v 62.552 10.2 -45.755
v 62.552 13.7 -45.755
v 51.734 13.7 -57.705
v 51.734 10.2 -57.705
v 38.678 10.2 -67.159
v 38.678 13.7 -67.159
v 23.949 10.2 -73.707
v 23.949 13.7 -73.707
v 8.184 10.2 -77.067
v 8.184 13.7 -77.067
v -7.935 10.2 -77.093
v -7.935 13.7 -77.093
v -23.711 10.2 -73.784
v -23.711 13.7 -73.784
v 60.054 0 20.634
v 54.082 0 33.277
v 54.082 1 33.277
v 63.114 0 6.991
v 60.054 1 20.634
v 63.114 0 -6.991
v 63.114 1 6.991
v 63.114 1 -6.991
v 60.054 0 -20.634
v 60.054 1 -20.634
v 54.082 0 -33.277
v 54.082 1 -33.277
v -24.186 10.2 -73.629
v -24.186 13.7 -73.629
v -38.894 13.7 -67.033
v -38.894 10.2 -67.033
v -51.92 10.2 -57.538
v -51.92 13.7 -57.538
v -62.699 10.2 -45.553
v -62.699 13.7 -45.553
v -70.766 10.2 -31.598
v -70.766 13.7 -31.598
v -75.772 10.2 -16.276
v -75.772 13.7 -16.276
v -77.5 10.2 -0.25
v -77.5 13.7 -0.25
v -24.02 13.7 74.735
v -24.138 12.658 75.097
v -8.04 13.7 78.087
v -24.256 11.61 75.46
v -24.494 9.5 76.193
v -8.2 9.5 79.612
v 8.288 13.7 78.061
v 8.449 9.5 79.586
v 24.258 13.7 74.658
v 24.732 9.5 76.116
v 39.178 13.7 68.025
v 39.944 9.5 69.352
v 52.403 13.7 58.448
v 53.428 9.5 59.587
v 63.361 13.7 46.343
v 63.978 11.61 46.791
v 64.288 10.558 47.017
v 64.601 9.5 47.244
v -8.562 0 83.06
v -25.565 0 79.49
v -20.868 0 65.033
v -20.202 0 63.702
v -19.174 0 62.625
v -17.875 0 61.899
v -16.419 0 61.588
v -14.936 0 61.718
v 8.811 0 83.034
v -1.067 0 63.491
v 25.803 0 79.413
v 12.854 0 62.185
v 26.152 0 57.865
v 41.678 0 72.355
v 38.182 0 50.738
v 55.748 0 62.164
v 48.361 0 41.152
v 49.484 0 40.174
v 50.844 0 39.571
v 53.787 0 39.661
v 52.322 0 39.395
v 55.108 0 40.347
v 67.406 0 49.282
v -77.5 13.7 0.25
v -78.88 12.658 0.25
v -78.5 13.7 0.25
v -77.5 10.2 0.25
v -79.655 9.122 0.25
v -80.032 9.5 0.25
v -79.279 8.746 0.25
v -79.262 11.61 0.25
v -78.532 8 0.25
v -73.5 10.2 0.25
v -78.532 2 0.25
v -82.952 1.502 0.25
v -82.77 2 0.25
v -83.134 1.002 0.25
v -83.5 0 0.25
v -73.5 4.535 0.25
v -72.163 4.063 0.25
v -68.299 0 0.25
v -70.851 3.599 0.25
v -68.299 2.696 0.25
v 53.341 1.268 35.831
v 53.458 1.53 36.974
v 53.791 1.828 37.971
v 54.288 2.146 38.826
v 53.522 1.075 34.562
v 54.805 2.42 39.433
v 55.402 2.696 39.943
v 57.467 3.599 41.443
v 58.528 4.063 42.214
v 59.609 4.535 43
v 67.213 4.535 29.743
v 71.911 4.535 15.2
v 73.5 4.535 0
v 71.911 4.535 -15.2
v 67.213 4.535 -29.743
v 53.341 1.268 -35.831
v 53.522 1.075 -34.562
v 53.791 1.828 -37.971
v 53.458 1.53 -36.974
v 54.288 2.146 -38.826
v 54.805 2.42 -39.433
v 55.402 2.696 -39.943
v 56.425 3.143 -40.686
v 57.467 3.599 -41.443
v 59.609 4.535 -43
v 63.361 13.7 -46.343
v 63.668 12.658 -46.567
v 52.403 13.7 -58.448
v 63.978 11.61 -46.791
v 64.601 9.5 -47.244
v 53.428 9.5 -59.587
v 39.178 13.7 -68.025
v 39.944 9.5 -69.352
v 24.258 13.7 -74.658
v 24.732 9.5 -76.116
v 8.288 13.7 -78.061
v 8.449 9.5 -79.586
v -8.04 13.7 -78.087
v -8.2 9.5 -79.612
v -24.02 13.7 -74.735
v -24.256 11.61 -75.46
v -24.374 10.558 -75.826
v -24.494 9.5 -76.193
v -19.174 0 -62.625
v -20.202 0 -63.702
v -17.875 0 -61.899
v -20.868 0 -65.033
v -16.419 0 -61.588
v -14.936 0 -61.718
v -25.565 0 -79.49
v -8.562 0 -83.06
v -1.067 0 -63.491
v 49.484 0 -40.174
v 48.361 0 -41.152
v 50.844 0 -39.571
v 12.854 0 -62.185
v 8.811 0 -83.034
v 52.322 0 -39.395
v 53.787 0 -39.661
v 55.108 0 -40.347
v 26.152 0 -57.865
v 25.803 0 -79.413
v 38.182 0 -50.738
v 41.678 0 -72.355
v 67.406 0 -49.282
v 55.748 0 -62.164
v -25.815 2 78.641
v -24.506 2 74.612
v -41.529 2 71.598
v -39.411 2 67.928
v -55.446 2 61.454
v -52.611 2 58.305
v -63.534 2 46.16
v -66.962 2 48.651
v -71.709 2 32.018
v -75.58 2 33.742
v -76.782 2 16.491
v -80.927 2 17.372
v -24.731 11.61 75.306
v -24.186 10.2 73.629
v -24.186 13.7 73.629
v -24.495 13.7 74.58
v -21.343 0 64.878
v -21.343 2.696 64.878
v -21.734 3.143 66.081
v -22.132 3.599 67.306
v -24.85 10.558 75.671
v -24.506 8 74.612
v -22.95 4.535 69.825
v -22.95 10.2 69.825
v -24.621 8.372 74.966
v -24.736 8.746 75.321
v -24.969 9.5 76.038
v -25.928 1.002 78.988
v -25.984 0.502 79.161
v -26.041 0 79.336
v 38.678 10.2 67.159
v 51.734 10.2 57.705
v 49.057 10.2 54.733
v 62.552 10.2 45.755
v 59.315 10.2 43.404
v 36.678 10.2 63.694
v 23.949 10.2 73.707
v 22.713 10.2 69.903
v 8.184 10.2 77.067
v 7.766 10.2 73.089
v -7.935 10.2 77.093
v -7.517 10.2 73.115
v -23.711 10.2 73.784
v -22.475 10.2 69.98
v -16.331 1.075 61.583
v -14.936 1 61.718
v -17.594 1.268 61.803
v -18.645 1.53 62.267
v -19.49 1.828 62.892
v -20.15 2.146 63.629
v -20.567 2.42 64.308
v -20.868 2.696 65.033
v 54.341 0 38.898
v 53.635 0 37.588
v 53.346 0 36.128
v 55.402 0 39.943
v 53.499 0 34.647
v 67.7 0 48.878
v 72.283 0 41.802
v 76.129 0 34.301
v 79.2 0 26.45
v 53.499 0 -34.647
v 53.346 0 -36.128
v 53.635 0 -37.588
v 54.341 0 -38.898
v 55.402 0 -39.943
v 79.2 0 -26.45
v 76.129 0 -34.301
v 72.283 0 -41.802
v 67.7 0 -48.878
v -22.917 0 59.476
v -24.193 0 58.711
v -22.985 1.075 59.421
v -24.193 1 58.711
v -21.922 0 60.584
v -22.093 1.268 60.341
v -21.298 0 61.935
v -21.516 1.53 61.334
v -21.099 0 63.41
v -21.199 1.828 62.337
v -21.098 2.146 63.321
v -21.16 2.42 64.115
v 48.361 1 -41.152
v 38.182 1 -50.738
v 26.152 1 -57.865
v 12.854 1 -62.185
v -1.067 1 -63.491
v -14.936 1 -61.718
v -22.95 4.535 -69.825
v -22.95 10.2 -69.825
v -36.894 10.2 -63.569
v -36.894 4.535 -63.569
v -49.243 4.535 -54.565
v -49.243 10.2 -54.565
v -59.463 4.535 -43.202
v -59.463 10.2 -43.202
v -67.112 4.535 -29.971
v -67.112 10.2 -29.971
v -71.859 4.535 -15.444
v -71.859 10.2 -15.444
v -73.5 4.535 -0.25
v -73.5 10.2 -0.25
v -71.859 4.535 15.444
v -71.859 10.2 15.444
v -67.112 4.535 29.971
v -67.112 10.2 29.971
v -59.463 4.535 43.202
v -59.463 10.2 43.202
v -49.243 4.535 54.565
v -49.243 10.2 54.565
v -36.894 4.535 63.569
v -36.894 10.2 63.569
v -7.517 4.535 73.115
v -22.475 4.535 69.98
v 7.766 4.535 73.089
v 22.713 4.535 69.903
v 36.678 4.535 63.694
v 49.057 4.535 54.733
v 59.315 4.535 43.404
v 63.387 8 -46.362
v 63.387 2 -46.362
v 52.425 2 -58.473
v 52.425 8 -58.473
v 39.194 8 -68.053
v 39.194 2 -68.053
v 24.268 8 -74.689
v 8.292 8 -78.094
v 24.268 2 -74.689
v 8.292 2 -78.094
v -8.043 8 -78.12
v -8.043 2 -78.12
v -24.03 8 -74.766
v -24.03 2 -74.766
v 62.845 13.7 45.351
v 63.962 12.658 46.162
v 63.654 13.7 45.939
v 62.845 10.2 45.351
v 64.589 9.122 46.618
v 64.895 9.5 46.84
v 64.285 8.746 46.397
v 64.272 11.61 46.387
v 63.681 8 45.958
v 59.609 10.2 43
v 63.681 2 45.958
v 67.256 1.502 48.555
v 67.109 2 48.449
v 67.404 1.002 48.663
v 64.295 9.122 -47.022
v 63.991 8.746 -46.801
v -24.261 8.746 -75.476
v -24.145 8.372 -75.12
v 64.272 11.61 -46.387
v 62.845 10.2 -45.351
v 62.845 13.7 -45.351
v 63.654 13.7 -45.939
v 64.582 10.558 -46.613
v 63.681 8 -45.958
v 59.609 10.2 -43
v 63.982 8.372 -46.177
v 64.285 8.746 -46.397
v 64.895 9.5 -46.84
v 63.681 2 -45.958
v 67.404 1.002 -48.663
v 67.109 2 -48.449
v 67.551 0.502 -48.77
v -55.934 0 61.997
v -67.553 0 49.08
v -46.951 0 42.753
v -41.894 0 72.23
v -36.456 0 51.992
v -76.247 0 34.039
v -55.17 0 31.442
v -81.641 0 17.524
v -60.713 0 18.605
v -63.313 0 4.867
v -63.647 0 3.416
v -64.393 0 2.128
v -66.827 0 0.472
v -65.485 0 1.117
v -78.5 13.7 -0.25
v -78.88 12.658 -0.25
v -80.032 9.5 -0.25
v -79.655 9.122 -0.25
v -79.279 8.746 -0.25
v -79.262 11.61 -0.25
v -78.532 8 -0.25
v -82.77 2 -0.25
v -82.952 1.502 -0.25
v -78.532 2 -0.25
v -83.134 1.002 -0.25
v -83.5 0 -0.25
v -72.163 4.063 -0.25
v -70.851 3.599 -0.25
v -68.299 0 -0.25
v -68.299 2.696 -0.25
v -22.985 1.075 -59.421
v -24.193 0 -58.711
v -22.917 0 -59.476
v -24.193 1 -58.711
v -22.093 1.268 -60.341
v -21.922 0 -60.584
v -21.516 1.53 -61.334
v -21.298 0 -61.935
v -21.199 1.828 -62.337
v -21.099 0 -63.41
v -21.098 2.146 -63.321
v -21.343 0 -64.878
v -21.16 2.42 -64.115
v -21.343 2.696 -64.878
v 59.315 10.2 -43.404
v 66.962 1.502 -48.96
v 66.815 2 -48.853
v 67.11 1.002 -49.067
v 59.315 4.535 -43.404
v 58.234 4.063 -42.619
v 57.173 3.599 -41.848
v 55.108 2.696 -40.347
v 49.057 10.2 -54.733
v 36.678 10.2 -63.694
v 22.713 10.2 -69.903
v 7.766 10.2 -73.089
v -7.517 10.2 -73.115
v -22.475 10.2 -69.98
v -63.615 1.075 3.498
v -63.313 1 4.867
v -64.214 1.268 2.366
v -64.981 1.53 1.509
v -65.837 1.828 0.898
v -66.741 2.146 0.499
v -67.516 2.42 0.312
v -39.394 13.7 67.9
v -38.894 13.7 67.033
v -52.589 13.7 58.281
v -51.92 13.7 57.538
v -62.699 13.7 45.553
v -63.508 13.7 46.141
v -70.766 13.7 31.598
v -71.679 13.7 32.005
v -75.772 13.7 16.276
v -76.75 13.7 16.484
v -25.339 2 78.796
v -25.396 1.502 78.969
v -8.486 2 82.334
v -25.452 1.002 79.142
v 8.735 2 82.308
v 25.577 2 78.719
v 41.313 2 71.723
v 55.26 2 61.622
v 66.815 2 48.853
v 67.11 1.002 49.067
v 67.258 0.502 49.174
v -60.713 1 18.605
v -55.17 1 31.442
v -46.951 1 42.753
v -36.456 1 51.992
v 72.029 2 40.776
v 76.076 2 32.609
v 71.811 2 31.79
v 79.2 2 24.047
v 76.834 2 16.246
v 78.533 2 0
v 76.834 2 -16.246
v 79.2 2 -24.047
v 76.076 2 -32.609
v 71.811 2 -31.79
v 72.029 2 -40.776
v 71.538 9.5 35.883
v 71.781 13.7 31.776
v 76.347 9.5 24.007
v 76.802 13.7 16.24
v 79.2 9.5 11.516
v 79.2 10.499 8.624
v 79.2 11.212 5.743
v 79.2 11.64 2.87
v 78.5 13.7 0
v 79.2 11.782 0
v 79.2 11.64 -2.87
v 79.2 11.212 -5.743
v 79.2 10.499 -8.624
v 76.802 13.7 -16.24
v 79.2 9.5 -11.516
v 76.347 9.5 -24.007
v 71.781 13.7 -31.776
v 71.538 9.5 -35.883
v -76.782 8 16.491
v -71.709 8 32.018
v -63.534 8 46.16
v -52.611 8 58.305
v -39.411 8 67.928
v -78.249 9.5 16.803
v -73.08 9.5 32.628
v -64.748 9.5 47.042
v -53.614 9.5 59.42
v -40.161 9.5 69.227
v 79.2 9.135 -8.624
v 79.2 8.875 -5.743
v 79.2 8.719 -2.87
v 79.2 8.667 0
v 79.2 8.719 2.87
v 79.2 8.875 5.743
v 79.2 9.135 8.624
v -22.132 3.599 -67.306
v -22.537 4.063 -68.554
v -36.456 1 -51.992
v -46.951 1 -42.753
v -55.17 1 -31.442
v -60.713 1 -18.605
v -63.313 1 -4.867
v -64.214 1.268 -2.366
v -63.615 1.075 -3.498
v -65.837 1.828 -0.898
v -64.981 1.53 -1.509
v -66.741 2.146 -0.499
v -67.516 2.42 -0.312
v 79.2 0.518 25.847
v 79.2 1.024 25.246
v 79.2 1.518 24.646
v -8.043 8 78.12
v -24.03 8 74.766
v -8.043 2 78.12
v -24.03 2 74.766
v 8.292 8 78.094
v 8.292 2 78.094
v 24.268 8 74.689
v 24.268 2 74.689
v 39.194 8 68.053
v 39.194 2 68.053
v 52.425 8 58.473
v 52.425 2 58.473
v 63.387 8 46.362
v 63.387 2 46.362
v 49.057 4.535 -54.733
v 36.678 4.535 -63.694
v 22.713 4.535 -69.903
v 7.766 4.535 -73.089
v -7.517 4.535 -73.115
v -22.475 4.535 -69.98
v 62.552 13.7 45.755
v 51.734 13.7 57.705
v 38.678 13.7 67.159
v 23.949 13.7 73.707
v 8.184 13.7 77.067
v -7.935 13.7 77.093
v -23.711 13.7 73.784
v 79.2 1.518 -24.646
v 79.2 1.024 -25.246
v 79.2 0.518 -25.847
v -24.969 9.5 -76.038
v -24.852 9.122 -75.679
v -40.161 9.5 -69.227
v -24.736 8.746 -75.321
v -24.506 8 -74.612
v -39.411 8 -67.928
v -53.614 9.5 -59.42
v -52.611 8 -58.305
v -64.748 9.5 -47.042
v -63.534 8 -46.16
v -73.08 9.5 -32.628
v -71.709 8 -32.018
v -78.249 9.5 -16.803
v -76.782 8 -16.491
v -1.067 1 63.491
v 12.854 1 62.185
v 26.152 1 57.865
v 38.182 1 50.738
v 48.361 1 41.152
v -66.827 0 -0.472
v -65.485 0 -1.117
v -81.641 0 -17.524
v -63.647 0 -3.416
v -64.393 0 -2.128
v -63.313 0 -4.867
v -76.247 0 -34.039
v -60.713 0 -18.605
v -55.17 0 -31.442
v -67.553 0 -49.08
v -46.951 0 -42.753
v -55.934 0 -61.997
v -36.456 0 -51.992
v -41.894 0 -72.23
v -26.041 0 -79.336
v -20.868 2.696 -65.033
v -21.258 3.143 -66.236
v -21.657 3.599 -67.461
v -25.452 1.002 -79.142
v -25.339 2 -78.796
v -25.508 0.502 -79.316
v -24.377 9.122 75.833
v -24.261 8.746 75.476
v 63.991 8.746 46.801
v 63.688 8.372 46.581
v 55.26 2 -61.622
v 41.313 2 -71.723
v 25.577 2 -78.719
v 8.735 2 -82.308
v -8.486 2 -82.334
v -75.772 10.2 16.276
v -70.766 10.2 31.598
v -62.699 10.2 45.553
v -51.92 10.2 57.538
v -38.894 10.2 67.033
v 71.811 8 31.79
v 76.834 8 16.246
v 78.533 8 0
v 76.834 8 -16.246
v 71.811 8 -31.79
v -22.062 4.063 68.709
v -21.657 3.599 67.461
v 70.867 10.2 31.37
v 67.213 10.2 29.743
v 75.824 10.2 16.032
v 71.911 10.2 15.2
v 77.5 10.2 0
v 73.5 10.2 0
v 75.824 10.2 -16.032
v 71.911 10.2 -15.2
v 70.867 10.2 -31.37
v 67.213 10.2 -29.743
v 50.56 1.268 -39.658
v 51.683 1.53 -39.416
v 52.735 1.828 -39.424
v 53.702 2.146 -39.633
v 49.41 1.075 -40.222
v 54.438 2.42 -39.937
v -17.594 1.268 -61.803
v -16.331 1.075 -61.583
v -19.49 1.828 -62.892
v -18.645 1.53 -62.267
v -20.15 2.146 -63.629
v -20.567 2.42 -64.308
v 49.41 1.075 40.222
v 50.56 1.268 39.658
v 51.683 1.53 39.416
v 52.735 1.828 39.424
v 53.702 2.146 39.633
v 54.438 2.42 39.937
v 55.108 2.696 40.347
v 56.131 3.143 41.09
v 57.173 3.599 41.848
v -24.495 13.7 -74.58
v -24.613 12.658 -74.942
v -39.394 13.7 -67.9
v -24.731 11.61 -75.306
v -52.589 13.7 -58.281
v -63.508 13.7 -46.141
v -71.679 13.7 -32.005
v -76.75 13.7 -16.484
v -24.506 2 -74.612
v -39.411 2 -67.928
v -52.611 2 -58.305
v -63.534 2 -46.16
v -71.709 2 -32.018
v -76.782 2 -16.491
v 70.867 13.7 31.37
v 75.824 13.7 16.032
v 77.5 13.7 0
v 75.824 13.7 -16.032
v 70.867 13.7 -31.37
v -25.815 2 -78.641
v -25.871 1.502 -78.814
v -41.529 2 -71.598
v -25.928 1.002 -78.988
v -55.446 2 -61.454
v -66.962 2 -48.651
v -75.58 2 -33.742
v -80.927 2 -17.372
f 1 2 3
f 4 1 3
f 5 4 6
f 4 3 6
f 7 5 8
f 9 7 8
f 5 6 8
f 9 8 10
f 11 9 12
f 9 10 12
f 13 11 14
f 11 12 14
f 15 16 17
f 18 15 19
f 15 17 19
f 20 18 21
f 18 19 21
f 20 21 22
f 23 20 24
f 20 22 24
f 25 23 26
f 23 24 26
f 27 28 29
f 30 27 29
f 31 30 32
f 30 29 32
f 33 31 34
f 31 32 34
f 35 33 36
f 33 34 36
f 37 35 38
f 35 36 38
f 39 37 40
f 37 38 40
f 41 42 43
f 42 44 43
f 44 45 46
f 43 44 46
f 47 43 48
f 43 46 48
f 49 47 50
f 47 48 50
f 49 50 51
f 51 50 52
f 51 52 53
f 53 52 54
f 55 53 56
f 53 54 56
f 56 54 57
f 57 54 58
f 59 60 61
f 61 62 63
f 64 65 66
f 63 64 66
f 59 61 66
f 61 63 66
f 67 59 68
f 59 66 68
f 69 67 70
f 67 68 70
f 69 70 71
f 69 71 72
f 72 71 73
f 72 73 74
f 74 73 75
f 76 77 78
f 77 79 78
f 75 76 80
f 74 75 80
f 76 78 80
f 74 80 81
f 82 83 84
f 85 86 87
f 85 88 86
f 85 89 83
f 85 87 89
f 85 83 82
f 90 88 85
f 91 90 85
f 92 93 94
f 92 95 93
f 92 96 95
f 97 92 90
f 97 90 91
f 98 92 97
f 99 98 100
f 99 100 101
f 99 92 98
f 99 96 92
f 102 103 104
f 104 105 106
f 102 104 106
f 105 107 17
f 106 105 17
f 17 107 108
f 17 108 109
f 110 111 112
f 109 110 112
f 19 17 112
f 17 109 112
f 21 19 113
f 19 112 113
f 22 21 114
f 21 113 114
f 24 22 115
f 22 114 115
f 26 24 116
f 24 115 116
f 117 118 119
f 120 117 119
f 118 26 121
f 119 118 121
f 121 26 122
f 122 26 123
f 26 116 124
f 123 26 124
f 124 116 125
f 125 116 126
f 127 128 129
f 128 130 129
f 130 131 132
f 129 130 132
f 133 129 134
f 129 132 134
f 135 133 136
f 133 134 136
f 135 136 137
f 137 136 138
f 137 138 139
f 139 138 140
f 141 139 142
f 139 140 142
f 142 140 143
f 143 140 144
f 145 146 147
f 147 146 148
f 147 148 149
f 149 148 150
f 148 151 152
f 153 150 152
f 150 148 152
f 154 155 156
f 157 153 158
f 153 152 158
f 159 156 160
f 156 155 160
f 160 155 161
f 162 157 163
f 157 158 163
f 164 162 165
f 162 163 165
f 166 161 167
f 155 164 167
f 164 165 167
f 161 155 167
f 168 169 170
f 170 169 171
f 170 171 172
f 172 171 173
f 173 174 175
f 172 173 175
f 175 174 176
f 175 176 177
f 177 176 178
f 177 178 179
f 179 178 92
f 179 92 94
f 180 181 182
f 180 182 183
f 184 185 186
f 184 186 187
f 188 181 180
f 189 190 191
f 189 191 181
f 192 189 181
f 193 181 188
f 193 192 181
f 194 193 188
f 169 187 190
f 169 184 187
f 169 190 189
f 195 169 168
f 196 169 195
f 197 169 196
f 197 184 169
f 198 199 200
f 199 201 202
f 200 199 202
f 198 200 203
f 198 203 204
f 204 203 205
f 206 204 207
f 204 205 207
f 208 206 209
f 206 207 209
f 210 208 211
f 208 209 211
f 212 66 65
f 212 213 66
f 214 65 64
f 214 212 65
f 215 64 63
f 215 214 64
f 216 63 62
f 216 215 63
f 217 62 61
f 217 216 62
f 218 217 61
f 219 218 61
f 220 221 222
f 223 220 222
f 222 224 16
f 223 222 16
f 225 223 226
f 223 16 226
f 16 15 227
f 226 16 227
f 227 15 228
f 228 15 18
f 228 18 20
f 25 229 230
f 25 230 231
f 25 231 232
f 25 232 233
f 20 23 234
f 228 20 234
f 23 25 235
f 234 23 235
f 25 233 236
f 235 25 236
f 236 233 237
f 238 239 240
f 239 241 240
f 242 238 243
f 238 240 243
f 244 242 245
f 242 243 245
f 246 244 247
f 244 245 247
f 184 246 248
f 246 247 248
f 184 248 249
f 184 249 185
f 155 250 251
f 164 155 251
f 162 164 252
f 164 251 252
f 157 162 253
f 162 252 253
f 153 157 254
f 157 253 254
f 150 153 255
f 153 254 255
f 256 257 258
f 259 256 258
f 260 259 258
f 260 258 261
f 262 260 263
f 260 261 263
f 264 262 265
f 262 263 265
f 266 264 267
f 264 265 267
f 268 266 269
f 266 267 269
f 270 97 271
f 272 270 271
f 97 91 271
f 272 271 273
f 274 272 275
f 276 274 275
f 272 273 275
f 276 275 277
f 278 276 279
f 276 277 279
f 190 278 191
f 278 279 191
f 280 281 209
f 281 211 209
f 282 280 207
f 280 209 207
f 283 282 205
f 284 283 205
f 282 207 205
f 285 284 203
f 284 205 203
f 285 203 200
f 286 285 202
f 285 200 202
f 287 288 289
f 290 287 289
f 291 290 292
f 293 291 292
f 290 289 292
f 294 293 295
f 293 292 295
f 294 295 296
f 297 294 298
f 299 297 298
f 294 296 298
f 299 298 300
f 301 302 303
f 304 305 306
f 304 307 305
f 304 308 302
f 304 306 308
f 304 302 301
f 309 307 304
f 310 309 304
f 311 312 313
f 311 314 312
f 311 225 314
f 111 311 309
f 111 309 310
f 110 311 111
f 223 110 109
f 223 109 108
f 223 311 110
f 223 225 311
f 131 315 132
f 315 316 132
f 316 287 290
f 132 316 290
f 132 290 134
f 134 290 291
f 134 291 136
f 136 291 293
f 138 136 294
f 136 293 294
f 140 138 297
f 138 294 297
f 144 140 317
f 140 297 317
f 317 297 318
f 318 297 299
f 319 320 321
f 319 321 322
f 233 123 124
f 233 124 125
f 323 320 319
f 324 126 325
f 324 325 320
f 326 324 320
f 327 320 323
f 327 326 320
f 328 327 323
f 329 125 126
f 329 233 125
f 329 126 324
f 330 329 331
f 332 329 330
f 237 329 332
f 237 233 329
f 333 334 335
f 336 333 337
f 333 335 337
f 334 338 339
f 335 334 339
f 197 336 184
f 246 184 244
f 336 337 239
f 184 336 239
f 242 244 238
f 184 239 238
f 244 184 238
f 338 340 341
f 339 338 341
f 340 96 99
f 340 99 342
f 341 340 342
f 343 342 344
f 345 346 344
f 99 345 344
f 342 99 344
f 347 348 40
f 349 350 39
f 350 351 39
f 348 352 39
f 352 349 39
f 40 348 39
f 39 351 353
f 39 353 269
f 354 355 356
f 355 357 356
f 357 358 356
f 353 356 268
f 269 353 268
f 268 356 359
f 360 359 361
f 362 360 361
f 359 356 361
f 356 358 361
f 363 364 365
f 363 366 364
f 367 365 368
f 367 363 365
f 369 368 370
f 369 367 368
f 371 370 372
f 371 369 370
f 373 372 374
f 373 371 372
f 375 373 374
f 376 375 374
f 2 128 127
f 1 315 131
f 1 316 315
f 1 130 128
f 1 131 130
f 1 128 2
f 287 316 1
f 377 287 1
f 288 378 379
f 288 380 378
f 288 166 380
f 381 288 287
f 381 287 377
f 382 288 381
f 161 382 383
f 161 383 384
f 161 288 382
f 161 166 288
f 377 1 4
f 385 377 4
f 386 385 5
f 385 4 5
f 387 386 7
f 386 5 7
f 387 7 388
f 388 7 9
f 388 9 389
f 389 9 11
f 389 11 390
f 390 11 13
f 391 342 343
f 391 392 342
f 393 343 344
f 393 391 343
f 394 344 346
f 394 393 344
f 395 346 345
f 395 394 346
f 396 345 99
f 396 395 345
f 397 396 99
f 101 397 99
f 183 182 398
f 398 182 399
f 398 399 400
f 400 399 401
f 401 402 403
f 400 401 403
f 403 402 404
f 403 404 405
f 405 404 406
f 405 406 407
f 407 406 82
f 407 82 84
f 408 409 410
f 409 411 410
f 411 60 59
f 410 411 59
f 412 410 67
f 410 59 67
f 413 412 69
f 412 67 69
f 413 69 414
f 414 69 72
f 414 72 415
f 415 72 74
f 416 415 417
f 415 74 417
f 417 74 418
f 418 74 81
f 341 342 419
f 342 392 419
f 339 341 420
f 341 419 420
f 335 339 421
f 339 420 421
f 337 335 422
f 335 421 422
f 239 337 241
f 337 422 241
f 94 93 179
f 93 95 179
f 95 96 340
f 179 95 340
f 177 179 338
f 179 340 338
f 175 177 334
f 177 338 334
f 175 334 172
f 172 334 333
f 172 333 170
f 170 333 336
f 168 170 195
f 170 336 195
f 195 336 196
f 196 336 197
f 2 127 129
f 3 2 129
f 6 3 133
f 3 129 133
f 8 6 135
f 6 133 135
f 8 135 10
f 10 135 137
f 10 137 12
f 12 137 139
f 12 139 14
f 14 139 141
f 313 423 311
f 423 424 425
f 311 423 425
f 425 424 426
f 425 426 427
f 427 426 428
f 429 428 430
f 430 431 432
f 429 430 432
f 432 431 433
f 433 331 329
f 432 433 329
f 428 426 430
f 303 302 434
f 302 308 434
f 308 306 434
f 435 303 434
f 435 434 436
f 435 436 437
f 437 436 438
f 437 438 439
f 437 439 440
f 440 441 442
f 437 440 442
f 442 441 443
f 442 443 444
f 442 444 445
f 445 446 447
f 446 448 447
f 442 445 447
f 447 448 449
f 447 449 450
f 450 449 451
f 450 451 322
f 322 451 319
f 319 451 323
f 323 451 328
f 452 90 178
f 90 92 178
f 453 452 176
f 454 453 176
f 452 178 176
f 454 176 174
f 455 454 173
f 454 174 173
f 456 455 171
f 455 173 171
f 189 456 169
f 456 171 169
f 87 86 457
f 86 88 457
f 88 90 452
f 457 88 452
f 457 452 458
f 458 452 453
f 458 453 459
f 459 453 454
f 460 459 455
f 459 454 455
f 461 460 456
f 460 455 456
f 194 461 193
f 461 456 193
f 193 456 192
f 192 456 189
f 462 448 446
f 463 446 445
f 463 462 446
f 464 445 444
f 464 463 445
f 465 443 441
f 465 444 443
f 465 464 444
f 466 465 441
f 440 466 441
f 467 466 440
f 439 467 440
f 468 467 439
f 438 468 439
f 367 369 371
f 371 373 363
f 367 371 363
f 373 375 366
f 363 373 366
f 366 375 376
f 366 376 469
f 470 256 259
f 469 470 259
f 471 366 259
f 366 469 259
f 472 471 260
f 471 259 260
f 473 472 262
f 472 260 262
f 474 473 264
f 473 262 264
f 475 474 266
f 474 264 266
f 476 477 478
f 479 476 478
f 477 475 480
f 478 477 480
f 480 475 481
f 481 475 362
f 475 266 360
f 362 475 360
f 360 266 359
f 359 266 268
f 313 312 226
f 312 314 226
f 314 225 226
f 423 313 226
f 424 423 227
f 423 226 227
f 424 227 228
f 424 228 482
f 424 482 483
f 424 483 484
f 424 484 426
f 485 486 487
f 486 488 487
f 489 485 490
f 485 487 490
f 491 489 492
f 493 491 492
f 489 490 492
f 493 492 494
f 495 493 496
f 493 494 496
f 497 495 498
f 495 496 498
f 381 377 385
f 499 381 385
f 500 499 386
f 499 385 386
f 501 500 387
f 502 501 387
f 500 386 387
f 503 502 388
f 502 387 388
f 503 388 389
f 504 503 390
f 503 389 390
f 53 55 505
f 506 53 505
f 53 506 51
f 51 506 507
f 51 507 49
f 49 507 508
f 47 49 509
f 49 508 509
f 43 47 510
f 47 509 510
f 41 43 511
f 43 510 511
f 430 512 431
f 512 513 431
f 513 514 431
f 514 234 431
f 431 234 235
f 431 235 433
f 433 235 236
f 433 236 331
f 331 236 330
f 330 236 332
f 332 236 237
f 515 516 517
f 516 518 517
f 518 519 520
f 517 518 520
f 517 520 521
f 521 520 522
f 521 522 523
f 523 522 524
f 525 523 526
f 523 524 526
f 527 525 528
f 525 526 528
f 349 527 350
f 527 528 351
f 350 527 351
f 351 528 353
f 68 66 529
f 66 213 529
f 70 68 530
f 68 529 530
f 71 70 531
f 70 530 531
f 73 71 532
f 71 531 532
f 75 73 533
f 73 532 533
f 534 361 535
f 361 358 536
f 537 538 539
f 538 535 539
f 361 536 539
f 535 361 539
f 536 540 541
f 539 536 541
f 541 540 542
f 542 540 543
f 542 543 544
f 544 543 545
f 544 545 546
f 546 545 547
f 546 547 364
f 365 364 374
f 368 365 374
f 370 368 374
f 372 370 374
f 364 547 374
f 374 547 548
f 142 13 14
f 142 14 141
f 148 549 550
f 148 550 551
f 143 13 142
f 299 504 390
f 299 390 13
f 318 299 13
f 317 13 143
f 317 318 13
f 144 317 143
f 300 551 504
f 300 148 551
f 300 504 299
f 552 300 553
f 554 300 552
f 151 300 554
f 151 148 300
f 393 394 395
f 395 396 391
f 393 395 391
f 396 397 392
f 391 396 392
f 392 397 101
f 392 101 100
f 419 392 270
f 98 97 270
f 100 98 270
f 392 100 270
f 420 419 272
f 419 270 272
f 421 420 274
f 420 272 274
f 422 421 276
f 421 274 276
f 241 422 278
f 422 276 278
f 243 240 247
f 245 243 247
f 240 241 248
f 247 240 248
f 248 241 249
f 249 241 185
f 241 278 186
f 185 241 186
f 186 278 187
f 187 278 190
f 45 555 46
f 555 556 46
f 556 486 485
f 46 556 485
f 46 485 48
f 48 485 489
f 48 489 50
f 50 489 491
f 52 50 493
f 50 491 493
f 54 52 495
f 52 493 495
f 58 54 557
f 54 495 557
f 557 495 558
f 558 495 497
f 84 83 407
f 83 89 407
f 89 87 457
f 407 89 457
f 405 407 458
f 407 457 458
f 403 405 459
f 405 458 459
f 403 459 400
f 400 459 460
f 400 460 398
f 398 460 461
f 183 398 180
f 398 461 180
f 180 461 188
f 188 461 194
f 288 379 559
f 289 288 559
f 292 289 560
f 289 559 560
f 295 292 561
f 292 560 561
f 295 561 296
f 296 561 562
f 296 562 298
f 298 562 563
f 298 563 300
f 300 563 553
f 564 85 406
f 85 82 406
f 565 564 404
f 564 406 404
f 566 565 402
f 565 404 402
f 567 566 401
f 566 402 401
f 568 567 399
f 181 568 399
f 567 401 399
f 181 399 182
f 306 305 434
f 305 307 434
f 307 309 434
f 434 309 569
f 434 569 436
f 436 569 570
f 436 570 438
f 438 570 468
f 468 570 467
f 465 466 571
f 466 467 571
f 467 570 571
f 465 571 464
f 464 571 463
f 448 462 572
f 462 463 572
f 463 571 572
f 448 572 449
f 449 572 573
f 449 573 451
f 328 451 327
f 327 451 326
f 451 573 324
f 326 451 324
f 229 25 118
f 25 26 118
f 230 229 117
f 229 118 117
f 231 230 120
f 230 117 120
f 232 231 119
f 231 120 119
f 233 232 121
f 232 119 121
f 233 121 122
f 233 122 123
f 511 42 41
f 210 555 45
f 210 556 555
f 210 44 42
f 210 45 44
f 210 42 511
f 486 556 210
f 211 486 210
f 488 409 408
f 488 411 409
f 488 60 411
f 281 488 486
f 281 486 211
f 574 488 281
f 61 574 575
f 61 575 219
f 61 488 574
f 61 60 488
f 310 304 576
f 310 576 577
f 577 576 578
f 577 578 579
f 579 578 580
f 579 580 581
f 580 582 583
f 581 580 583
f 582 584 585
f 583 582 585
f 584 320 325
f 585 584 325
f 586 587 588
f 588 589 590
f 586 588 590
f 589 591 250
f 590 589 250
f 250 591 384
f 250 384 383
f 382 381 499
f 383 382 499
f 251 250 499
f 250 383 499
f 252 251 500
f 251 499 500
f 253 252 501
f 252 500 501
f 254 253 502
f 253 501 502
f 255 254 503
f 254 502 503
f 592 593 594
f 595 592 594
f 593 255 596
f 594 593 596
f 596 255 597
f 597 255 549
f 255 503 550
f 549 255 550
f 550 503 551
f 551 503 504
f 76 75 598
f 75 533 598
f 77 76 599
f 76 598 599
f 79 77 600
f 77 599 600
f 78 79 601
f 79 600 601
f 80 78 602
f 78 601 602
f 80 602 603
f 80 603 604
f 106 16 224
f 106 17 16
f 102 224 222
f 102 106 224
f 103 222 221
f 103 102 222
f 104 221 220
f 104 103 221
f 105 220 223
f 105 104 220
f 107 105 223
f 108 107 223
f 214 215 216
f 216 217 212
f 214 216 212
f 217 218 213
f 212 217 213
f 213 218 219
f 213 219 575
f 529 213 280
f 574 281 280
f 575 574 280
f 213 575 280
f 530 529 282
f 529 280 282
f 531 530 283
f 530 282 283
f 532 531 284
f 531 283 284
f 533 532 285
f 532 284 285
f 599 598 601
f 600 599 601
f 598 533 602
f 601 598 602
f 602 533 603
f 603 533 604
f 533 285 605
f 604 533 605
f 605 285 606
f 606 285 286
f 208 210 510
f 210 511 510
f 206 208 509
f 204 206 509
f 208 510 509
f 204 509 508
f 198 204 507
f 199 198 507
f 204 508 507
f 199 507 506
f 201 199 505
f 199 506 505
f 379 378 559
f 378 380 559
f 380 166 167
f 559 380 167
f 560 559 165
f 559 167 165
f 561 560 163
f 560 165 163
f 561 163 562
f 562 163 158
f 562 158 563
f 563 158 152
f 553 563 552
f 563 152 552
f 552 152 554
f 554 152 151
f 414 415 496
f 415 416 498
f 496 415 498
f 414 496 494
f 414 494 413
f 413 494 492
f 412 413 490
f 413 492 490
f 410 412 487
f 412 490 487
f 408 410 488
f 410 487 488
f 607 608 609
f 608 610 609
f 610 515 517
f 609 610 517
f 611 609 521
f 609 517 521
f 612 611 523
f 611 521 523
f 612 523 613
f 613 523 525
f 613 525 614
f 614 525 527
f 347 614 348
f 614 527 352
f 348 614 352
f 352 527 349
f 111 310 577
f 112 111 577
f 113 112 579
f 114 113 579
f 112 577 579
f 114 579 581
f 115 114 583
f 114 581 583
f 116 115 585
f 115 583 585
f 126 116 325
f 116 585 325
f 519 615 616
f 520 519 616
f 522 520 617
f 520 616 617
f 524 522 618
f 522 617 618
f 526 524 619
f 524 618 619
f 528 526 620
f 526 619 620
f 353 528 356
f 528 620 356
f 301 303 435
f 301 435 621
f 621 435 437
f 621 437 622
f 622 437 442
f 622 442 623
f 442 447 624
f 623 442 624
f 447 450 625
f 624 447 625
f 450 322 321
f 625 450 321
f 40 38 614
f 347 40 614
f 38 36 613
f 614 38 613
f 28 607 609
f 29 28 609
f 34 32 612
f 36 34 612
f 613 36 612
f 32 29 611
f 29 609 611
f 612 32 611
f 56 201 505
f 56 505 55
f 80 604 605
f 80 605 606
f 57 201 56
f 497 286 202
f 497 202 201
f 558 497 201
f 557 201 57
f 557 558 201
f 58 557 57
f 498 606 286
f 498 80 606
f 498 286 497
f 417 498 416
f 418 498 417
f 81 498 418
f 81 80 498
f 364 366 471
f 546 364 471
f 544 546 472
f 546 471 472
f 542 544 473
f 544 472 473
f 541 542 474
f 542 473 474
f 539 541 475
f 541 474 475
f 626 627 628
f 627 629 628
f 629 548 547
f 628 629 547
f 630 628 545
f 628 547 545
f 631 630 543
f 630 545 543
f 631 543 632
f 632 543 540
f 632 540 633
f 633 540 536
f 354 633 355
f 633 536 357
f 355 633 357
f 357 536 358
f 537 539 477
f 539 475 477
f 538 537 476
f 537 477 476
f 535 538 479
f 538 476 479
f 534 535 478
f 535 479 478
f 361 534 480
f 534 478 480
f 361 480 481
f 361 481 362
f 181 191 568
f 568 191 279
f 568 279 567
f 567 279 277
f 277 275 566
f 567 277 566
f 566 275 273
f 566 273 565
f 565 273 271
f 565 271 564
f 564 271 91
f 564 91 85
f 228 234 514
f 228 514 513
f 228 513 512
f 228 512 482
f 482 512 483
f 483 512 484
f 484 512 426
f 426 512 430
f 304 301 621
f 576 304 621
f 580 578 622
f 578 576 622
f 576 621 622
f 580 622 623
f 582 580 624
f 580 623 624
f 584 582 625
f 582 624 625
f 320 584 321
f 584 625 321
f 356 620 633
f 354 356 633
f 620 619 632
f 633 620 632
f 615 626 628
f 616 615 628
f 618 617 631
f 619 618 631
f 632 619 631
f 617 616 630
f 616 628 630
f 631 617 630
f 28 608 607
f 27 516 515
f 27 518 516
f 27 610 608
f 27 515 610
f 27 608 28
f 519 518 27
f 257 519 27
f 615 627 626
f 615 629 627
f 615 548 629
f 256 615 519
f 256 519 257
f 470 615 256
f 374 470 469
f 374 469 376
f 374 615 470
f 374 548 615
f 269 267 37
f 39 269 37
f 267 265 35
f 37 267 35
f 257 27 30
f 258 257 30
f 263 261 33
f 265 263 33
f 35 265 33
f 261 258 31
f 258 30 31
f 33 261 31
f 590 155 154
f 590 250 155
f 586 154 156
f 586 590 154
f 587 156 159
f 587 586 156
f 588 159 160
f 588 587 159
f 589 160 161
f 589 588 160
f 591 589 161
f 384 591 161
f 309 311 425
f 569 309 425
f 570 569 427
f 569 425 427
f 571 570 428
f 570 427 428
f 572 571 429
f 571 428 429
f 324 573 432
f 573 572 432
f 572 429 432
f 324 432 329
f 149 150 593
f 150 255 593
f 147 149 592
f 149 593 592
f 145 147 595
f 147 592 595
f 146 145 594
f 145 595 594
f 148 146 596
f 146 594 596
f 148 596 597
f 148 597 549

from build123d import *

# Parameters (mm, degrees)
CUT_EXTRUDE1_DEPTH      = 14.7
SKETCH4_W               = 52.41384378
SKETCH4_H               = 0.5
CUT_EXTRUDE3_DEPTH      = 14.7
CUT_EXTRUDE3_DEPTH_BACK = 1
FILLET2_R               = 5
FILLET3_R               = 5
FILLET4_R               = 5
FILLET5_R               = 5
FILLET6_R               = 5


with BuildPart() as part:
    # Sketch1 → Revolve1 (revolve)
    with BuildSketch(Plane.XY):
        Polygon((63.5, 0), (63.5, 1), (73.5, 4.53484861), (73.5, 10.2), (77.5, 10.2), (77.5, 13.7), (78.5, 13.7), (80.032846715, 9.5), (78.532846715, 8), (78.532846715, 2), (82.770072993, 2), (83.5, 0), align=None)
    revolve(axis=Axis((0, 0, 0), (0, 1, 0)))

    # Sketch2 → Cut-Extrude1 (cut, through all)
    with BuildSketch(Plane(origin=(0, 0, 0), x_dir=(1, 0, 0), z_dir=(0, 1, 0))):
        with BuildLine():
            Line((79.2, 26.450141777), (79.2, -26.450141777))
            ThreePointArc((79.2, -26.450141777), (83.5, 0), (79.2, 26.450141777))
        make_face()
    extrude(amount=CUT_EXTRUDE1_DEPTH, mode=Mode.SUBTRACT)

    # Sketch4 → Cut-Extrude3 (cut, two sides)
    with BuildSketch(Plane(origin=(0, 0, 0), x_dir=(1, 0, 0), z_dir=(0, 1, 0))) as cut_extrude3_sk:
        Polygon((-31.102458296, 96.532540857), (-31.577986554, 96.378032359), (-15.381218085, 46.529504688), (-14.905689827, 46.684013185), align=None)
        with Locations((-75.212168306, 0)):
            Rectangle(SKETCH4_W, SKETCH4_H)
        Polygon((82.196713836, 59.41039127), (81.90282121, 59.814899767), (39.499130851, 29.006815377), (39.793023477, 28.60230688), align=None)
        Polygon((81.90282121, -59.814899767), (82.196713836, -59.41039127), (39.793023477, -28.60230688), (39.499130851, -29.006815377), align=None)
        Polygon((-31.577986554, -96.378032359), (-31.102458296, -96.532540857), (-14.905689827, -46.684013185), (-15.381218085, -46.529504688), align=None)
    extrude(amount=CUT_EXTRUDE3_DEPTH, mode=Mode.SUBTRACT)
    extrude(cut_extrude3_sk.sketch, amount=-CUT_EXTRUDE3_DEPTH_BACK, mode=Mode.SUBTRACT)

    # Fillet2
    fillet2_edges = [part.edges().sort_by_distance(p)[0] for p in [
        (-19.860191196, 0.5, -60.314366495),
        (-63.499507872, 0.5, -0.25),
    ]]
    fillet(fillet2_edges, radius=FILLET2_R)

    # Fillet3
    fillet3_edges = [part.edges().sort_by_distance(p)[0] for p in [
        (-19.860191196, 0.5, 60.314366495),
        (-63.499507872, 0.5, 0.25),
    ]]
    fillet(fillet3_edges, radius=FILLET3_R)

    # Fillet4
    fillet4_edges = [part.edges().sort_by_distance(p)[0] for p in [
        (51.22523469, 0.5, 37.526328504),
        (-19.384662938, 0.5, 60.468874992),
    ]]
    fillet(fillet4_edges, radius=FILLET4_R)

    # Fillet5
    fillet5_edges = [part.edges().sort_by_distance(p)[0] for p in [
        (51.519127316, 0.5, -37.121820006),
        (51.519127316, 0.5, 37.121820006),
    ]]
    fillet(fillet5_edges, radius=FILLET5_R)

    # Fillet6
    fillet6_edges = [part.edges().sort_by_distance(p)[0] for p in [
        (51.22523469, 0.5, -37.526328504),
        (-19.384662938, 0.5, -60.468874992),
    ]]
    fillet(fillet6_edges, radius=FILLET6_R)


solid = part.part
